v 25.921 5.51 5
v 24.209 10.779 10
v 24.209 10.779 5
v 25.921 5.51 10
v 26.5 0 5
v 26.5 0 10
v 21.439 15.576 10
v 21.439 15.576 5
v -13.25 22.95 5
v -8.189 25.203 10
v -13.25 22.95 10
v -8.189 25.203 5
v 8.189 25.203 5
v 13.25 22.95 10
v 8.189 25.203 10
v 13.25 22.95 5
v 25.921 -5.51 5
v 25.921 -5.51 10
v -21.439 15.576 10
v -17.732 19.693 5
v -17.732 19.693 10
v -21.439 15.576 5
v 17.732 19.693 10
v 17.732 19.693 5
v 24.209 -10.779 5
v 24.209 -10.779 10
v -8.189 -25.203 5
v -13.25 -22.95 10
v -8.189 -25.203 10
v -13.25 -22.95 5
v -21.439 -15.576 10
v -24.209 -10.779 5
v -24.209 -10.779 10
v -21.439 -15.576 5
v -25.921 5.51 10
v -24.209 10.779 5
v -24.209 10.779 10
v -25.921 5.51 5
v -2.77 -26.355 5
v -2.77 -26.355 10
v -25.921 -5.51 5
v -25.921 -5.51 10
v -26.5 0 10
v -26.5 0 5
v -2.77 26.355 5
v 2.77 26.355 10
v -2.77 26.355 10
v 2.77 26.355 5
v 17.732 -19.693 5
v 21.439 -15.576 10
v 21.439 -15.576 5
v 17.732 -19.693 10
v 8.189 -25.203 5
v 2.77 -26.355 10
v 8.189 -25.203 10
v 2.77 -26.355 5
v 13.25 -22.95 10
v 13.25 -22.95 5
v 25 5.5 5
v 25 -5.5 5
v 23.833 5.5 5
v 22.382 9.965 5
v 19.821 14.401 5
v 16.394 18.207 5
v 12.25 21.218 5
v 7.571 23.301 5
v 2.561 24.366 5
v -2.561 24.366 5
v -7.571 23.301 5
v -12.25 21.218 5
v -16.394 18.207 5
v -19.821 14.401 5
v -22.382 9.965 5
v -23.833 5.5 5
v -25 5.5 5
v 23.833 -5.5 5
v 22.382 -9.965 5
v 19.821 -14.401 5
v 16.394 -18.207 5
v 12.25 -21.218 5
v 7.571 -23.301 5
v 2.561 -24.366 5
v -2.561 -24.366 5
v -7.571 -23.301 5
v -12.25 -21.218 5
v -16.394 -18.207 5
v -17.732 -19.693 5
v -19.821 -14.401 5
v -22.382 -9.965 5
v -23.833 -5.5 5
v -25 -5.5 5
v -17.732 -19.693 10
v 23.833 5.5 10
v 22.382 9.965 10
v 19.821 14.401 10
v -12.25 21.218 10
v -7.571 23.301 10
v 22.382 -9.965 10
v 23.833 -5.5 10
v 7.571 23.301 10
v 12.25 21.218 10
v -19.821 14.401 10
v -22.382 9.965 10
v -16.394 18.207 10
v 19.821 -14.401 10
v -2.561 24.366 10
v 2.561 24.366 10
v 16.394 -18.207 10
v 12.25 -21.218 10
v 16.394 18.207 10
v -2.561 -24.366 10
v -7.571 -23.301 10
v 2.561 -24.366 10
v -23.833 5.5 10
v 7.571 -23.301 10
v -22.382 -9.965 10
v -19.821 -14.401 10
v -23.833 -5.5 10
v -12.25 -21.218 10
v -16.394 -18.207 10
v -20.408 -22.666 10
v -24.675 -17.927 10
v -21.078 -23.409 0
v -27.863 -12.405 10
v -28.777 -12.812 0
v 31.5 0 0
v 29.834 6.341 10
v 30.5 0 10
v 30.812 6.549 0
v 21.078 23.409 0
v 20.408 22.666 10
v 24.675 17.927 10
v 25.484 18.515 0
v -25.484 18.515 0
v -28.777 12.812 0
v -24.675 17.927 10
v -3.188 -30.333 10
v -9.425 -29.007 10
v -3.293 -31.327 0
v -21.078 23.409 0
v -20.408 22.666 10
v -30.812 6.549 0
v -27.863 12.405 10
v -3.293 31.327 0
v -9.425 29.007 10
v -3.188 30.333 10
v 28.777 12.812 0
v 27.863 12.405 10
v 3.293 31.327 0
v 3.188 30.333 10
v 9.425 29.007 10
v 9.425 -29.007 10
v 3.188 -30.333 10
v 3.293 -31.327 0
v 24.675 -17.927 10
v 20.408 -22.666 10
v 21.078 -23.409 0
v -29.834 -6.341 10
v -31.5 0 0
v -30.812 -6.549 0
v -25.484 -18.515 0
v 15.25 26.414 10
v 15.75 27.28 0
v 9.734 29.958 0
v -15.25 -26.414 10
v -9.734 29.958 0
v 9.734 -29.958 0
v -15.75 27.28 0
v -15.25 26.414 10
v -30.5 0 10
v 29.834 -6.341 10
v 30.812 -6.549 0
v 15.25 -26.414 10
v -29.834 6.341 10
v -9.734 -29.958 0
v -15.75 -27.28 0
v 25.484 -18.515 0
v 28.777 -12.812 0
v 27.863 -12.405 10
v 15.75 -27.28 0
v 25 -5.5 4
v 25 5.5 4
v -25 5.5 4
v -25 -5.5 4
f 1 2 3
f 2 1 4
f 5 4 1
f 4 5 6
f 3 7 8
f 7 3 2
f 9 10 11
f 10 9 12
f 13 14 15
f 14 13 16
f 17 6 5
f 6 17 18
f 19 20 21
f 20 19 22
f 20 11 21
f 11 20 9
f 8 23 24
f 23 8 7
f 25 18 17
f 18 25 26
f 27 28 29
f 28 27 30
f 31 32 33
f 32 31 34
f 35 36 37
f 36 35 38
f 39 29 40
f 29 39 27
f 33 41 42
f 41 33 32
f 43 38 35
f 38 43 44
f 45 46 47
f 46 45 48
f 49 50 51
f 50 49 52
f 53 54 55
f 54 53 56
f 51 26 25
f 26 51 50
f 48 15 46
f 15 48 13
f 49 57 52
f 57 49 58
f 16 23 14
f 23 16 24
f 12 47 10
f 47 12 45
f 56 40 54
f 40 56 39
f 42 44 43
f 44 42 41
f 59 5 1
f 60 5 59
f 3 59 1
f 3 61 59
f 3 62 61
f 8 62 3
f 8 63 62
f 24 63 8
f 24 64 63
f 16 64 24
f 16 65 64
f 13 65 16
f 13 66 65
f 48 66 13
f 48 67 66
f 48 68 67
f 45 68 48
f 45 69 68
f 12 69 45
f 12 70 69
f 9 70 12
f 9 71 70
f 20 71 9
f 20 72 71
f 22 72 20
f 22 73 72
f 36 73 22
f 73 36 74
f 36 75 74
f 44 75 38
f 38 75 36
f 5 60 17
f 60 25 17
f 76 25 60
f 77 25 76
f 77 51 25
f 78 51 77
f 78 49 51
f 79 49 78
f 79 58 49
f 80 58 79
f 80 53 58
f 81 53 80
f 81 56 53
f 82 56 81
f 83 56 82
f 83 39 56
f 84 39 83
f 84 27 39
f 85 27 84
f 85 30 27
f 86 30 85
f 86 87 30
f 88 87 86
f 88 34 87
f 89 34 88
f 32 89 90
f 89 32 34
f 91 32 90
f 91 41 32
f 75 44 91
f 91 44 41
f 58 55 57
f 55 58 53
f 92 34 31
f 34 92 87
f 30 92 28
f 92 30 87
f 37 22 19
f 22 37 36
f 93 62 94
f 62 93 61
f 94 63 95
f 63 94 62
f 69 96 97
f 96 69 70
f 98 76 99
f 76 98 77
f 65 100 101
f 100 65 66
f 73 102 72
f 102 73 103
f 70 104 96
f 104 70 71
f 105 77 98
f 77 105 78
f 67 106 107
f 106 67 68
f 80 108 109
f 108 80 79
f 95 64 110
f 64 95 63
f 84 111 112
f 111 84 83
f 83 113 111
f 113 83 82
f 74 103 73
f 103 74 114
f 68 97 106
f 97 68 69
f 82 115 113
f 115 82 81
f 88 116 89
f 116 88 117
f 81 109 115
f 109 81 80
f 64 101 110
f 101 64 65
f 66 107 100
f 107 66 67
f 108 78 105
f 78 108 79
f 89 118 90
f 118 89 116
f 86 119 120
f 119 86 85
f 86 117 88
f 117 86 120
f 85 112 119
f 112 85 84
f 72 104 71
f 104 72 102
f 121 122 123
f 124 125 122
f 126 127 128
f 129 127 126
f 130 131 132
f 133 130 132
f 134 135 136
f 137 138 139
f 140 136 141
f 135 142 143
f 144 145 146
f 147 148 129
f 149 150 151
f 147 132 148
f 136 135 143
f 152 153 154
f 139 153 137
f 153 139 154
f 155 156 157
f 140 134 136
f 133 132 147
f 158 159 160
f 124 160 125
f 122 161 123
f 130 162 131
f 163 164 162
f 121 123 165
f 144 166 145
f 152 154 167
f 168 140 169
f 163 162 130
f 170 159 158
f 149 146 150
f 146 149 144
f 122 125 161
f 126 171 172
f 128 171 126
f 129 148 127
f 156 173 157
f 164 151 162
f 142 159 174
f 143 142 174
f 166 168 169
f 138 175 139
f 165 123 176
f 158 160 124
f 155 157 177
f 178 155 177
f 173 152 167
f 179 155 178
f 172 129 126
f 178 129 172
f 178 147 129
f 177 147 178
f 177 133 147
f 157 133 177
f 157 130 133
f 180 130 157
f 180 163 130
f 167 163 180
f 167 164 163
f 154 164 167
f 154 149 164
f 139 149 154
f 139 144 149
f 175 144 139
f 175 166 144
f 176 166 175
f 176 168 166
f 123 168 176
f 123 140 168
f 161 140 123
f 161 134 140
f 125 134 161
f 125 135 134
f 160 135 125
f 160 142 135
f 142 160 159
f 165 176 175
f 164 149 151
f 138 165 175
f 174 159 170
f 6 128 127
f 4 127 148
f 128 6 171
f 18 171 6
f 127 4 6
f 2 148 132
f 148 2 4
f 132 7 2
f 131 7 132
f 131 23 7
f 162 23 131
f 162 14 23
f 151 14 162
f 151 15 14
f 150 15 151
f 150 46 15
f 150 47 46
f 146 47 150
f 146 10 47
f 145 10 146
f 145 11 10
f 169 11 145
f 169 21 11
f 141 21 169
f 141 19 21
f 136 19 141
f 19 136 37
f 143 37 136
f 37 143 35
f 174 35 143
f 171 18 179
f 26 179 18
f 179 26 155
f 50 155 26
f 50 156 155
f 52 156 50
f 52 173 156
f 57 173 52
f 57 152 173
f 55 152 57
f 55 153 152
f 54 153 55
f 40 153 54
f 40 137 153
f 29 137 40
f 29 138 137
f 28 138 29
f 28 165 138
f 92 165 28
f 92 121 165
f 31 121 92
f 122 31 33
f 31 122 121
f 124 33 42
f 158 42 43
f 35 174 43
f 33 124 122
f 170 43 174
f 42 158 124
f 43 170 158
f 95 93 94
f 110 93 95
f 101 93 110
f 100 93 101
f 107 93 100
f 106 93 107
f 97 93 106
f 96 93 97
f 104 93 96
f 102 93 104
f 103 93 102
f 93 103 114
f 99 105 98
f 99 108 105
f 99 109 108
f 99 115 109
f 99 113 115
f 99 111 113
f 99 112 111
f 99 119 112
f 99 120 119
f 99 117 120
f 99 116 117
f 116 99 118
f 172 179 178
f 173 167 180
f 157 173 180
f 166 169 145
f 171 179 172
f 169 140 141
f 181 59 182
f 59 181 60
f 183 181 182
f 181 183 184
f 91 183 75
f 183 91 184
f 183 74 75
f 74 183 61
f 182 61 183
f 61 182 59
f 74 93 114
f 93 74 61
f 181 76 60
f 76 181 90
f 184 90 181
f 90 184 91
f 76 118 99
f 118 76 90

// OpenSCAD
// A stand for holding the bottom half of rockets flat
//
// A wide-based cylinder with a cutout to hold a tube and a slot to accomodate a godnut
module stand(
    // Rocket parameters
    inner_diam,
    outer_diam,
    godnut_width,
    godnut_depth,
    // Stand parameters
    godnut_offset=1,
    stand_depth=10,
    tube_notch_depth=5,
    tube_notch_offset=0.5,
    bottom_rim_width=5,
    top_rim_width=4
) {
    notch_depth = godnut_depth + godnut_offset + 1;

    difference() {
        // Outer cylinder
        cylinder(
            r1 = (outer_diam / 2) + tube_notch_offset + bottom_rim_width,
            r2 = (outer_diam / 2) + tube_notch_offset + top_rim_width,
            h = stand_depth
        );

        // Tube cutout
        translate([0, 0, stand_depth - tube_notch_depth])
        difference() {
            cylinder(
                r = (outer_diam / 2) + tube_notch_offset,
                h = tube_notch_depth + 1
            );

            translate([0, 0, -1]) cylinder(
                r = (inner_diam / 2) - tube_notch_offset,
                h = tube_notch_depth + 3
            );
        }

        // Godnut notch
        translate([0, 0, (notch_depth / 2) + stand_depth - notch_depth + 1])
        cube([
            inner_diam,
            godnut_width + godnut_offset,
            notch_depth
        ], center = true);
    }
}

stand(50, 52, 10, 5);
